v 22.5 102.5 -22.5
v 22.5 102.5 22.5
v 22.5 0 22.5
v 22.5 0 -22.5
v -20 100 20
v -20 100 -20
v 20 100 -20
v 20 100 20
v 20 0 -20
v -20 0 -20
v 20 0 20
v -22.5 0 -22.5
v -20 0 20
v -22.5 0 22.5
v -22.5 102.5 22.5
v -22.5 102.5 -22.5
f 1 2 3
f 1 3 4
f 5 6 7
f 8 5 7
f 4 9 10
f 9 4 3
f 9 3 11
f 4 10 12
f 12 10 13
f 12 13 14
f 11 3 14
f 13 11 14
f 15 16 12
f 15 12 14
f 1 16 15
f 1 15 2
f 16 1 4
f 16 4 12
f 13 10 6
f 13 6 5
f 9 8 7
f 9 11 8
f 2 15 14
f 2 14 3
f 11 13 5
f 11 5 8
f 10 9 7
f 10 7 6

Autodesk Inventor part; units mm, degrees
ref_plane "YZ Plane" through (0, 0, 0) normal (1, 0, 0) x (0, 1, 0)
ref_plane "XZ Plane" through (0, 0, 0) normal (0, 1, 0) x (-1, 0, 0)
ref_plane "XY Plane" through (0, 0, 0) normal (0, 0, 1) x (1, 0, 0)
sketch "Sketch1" plane through (0, 0, 0) normal (0, 1, 0) x (-1, 0, 0)
  line L0 (0, -31.5) -> (0, 31.5) construction
  line L1 (-31.5, 0) -> (31.5, 0) construction
  line L2 (22.5, 22.5) -> (-22.5, 22.5)
  line L3 (-22.5, 22.5) -> (-22.5, -22.5)
  line L4 (-22.5, -22.5) -> (22.5, -22.5)
  line L5 (22.5, -22.5) -> (22.5, 22.5)
  line L6 (20, 20) -> (-20, 20)
  line L7 (-20, 20) -> (-20, -20)
  line L8 (-20, -20) -> (20, -20)
  line L9 (20, -20) -> (20, 20)
  point P0 (0, 0)
  dimension "d0" = 45
  dimension "d1" = 45
  dimension "d2" = 40
  dimension "d3" = 40
extrude "Extrusion1" add sketch "Sketch1" along normal blind 100
sketch "Sketch2" plane through (0, 100, 0) normal (0, 1, 0) x (1, 0, 0)
  line L0 (-22.5, 22.5) -> (-22.5, -22.5) projected
  line L1 (-22.5, -22.5) -> (22.5, -22.5) projected
  line L2 (22.5, -22.5) -> (22.5, 22.5) projected
  line L3 (22.5, 22.5) -> (-22.5, 22.5) projected
  point P0 (0, 0)
extrude "Extrusion2" add sketch "Sketch2" along normal blind 2.5
properties part number "UQ-753-H100-40x40x100mm" material "Glass"
